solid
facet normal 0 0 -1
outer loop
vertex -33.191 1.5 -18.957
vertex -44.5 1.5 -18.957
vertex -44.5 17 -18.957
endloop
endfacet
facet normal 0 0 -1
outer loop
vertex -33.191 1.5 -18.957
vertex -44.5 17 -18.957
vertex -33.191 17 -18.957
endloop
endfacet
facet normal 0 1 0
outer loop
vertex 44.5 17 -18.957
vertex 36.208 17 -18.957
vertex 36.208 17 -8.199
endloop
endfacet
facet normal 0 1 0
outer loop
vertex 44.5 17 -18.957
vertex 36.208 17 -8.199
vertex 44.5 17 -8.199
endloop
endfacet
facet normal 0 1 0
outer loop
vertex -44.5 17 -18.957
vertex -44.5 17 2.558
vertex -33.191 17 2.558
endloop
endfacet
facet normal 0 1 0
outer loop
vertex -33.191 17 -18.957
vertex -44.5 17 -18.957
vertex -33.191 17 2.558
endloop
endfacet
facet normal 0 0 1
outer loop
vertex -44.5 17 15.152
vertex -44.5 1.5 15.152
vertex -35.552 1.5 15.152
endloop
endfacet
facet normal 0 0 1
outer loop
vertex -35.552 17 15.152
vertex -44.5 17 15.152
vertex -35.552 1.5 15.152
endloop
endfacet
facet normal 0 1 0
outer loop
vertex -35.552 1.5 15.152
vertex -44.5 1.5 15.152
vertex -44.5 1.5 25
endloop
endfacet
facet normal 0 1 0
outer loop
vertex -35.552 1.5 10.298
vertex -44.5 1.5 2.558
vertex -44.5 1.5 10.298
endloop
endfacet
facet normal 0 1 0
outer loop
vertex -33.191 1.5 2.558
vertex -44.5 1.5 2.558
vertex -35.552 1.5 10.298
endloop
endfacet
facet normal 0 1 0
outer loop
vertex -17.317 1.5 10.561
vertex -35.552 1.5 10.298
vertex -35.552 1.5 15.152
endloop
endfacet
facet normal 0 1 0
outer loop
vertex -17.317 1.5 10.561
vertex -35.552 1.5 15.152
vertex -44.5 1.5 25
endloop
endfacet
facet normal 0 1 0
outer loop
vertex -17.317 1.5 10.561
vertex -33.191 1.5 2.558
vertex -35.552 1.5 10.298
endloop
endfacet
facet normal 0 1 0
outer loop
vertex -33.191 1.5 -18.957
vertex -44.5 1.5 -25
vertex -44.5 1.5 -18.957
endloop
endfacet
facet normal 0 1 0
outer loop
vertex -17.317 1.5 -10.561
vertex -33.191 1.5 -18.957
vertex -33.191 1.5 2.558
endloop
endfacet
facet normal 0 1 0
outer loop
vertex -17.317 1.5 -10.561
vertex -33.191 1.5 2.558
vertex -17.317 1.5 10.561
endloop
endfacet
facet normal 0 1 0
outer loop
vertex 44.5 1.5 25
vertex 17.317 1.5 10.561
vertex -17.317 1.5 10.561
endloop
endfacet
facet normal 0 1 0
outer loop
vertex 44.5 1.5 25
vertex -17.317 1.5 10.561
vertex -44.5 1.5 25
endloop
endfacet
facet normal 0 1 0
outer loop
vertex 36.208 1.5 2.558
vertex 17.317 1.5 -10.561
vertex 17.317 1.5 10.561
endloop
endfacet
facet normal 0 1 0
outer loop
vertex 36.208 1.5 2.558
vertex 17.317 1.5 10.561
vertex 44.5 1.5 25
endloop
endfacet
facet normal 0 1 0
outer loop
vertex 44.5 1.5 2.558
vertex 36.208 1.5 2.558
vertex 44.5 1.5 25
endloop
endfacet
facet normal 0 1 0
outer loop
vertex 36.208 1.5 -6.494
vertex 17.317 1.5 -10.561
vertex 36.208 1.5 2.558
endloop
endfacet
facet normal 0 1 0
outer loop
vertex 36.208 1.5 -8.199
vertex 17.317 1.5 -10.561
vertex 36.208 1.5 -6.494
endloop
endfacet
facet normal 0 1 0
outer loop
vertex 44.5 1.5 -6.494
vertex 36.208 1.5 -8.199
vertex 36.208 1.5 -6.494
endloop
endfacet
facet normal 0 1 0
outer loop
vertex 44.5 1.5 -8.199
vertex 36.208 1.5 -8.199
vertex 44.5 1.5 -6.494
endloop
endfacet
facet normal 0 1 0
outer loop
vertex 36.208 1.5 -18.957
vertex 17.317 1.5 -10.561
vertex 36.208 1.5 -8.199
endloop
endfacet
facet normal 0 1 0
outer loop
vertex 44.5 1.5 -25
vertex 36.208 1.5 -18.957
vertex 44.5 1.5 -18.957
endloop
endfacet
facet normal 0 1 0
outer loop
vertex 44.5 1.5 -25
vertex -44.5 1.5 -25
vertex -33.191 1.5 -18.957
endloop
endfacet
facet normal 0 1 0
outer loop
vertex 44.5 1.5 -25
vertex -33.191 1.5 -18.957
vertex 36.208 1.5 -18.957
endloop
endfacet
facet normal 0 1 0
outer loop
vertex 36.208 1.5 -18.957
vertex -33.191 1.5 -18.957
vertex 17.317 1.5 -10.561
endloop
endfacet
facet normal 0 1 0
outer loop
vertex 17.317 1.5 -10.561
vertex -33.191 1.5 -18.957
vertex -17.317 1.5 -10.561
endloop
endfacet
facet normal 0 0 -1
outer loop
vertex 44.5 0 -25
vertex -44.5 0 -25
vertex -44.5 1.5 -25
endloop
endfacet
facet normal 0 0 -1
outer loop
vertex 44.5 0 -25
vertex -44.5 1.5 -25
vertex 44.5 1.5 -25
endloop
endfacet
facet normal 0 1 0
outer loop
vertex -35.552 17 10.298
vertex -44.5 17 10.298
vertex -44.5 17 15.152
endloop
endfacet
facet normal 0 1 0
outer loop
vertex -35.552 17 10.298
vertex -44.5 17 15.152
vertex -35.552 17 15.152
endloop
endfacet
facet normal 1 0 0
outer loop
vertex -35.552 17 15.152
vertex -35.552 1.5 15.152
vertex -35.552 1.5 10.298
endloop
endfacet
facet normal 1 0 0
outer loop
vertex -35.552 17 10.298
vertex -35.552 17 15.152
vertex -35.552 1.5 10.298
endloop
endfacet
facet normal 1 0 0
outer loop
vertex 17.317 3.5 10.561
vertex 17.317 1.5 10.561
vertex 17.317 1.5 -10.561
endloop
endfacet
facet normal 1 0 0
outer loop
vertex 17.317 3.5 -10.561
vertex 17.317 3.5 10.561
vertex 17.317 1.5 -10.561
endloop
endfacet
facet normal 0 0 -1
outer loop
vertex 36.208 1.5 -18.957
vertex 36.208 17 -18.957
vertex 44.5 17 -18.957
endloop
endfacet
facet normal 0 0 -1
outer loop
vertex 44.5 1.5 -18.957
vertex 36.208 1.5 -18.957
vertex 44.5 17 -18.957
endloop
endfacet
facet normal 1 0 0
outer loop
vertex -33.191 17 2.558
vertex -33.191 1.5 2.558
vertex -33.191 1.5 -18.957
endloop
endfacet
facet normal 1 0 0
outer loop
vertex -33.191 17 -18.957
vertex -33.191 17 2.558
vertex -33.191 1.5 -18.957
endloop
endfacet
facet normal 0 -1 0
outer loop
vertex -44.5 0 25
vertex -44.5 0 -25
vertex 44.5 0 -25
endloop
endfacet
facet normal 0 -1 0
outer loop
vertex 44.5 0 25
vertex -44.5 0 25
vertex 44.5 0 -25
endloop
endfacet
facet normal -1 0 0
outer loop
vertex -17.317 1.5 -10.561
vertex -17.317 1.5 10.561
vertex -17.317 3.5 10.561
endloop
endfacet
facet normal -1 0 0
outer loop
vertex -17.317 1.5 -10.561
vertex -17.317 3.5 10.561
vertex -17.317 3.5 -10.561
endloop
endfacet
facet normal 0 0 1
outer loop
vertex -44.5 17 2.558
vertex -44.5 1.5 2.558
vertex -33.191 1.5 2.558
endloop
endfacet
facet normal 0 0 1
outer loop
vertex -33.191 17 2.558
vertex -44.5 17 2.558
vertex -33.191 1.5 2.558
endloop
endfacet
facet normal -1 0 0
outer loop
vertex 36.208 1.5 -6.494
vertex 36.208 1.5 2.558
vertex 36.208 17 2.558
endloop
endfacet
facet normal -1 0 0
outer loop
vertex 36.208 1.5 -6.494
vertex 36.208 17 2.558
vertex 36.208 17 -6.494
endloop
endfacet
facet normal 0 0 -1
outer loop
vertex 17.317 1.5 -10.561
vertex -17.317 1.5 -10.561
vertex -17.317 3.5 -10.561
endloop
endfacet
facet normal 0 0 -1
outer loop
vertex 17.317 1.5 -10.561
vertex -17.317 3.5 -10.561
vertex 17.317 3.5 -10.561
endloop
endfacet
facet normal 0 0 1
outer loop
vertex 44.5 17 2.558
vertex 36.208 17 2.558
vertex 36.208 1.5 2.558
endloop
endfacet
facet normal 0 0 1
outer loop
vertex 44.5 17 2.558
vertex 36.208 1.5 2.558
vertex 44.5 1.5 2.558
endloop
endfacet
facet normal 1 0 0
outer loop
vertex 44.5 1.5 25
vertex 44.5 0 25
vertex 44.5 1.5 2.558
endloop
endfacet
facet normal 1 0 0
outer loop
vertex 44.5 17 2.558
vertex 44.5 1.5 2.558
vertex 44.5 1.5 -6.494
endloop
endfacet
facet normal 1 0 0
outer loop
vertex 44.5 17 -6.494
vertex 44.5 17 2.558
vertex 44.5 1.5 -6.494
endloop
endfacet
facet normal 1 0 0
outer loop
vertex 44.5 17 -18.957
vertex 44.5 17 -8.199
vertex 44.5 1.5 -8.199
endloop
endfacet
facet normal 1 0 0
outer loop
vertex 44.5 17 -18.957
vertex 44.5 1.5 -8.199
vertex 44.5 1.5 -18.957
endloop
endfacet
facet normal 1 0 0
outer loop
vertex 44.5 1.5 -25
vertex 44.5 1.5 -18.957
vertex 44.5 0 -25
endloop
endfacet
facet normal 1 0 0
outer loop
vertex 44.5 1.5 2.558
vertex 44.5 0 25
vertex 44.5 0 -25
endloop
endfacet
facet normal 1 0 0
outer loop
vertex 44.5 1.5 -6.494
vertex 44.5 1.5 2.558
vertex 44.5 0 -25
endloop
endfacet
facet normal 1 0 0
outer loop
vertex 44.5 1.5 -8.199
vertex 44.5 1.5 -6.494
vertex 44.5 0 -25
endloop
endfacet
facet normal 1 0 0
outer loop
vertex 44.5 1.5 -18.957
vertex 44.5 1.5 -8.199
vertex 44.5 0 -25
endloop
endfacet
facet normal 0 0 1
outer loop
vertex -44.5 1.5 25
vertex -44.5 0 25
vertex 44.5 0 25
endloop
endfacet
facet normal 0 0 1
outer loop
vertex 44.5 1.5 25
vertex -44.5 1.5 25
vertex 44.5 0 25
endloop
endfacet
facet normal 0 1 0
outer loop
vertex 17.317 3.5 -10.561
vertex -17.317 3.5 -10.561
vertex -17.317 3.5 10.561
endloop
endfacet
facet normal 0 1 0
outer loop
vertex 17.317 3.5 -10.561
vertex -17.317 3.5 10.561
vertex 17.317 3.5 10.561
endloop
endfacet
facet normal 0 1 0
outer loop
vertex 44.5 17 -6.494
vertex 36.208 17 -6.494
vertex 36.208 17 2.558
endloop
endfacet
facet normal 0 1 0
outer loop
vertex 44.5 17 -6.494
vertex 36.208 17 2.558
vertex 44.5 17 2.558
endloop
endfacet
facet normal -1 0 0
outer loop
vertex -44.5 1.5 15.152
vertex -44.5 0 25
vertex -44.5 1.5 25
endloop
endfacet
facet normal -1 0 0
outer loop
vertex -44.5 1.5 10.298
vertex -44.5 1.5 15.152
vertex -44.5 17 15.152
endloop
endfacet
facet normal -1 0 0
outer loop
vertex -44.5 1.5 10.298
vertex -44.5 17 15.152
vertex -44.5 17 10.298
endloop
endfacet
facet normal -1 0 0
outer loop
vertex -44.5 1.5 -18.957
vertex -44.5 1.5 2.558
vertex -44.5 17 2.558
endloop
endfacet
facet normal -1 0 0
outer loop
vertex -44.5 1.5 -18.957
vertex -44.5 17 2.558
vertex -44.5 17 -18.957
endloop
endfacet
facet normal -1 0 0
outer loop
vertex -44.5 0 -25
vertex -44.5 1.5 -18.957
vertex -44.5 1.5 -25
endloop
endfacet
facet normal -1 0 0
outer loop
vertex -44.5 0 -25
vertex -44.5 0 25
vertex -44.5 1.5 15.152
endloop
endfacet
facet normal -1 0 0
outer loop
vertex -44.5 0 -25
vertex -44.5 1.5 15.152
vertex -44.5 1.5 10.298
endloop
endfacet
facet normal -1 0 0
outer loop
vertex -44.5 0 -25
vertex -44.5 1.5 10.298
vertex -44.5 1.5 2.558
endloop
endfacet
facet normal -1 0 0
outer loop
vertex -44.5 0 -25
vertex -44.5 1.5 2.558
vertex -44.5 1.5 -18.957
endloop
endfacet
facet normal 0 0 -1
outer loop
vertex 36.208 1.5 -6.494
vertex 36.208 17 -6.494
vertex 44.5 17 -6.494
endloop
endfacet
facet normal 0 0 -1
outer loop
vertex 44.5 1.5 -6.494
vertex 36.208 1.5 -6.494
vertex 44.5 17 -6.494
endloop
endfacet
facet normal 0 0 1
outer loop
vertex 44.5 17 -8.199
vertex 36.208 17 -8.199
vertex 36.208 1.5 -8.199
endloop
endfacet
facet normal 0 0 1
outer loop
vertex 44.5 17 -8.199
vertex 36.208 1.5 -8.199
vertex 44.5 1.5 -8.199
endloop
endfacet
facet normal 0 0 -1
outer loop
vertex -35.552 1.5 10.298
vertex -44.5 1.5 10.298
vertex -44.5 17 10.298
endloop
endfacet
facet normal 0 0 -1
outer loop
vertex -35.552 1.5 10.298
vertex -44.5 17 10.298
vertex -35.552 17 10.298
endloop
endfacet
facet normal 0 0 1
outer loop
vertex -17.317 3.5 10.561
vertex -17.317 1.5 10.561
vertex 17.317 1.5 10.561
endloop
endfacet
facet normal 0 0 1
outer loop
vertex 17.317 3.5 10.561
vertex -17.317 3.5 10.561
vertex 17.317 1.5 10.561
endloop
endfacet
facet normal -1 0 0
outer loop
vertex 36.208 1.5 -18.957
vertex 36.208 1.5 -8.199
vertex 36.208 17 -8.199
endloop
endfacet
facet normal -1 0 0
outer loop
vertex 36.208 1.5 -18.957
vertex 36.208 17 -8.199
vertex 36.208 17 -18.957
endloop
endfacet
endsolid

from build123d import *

# Parameters (mm, degrees)
SKETCH1_W           = 89
SKETCH1_H           = 50
BOSS_EXTRUDE1_DEPTH = 1.5
SKETCH2_W           = 11.309347118
SKETCH2_H           = 21.514889616
SKETCH2_W_2         = 8.947956794
SKETCH2_H_2         = 4.853968999
SKETCH2_W_3         = 8.292015037
SKETCH2_H_3         = 10.757444808
SKETCH2_H_4         = 9.051996241
BOSS_EXTRUDE2_DEPTH = 15.5
SKETCH3_W           = 34.633694204
SKETCH3_H           = 21.121311428
BOSS_EXTRUDE3_DEPTH = 2


with BuildPart() as part:
    # Sketch1 → Boss-Extrude1 (new body)
    with BuildSketch(Plane(origin=(0, 0, 0), x_dir=(1, 0, 0), z_dir=(0, 1, 0))):
        Rectangle(SKETCH1_W, SKETCH1_H)
    extrude(amount=BOSS_EXTRUDE1_DEPTH)

    # Sketch2 → Boss-Extrude2 (add)
    with BuildSketch(Plane(origin=(0, 1.5, 0), x_dir=(1, 0, 0), z_dir=(0, 1, 0))):
        with Locations((-38.845326441, 8.199271957)):
            Rectangle(SKETCH2_W, SKETCH2_H)
        with Locations((-40.026021603, -12.725270077)):
            Rectangle(SKETCH2_W_2, SKETCH2_H_2)
        with Locations((40.353992482, 13.577994361)):
            Rectangle(SKETCH2_W_3, SKETCH2_H_3)
        with Locations((40.353992482, 1.96782527)):
            Rectangle(SKETCH2_W_3, SKETCH2_H_4)
    extrude(amount=BOSS_EXTRUDE2_DEPTH)

    # Sketch3 → Boss-Extrude3 (add)
    with BuildSketch(Plane(origin=(0, 1.5, 0), x_dir=(1, 0, 0), z_dir=(0, 1, 0))):
        Rectangle(SKETCH3_W, SKETCH3_H)
    extrude(amount=BOSS_EXTRUDE3_DEPTH)


solid = part.part
